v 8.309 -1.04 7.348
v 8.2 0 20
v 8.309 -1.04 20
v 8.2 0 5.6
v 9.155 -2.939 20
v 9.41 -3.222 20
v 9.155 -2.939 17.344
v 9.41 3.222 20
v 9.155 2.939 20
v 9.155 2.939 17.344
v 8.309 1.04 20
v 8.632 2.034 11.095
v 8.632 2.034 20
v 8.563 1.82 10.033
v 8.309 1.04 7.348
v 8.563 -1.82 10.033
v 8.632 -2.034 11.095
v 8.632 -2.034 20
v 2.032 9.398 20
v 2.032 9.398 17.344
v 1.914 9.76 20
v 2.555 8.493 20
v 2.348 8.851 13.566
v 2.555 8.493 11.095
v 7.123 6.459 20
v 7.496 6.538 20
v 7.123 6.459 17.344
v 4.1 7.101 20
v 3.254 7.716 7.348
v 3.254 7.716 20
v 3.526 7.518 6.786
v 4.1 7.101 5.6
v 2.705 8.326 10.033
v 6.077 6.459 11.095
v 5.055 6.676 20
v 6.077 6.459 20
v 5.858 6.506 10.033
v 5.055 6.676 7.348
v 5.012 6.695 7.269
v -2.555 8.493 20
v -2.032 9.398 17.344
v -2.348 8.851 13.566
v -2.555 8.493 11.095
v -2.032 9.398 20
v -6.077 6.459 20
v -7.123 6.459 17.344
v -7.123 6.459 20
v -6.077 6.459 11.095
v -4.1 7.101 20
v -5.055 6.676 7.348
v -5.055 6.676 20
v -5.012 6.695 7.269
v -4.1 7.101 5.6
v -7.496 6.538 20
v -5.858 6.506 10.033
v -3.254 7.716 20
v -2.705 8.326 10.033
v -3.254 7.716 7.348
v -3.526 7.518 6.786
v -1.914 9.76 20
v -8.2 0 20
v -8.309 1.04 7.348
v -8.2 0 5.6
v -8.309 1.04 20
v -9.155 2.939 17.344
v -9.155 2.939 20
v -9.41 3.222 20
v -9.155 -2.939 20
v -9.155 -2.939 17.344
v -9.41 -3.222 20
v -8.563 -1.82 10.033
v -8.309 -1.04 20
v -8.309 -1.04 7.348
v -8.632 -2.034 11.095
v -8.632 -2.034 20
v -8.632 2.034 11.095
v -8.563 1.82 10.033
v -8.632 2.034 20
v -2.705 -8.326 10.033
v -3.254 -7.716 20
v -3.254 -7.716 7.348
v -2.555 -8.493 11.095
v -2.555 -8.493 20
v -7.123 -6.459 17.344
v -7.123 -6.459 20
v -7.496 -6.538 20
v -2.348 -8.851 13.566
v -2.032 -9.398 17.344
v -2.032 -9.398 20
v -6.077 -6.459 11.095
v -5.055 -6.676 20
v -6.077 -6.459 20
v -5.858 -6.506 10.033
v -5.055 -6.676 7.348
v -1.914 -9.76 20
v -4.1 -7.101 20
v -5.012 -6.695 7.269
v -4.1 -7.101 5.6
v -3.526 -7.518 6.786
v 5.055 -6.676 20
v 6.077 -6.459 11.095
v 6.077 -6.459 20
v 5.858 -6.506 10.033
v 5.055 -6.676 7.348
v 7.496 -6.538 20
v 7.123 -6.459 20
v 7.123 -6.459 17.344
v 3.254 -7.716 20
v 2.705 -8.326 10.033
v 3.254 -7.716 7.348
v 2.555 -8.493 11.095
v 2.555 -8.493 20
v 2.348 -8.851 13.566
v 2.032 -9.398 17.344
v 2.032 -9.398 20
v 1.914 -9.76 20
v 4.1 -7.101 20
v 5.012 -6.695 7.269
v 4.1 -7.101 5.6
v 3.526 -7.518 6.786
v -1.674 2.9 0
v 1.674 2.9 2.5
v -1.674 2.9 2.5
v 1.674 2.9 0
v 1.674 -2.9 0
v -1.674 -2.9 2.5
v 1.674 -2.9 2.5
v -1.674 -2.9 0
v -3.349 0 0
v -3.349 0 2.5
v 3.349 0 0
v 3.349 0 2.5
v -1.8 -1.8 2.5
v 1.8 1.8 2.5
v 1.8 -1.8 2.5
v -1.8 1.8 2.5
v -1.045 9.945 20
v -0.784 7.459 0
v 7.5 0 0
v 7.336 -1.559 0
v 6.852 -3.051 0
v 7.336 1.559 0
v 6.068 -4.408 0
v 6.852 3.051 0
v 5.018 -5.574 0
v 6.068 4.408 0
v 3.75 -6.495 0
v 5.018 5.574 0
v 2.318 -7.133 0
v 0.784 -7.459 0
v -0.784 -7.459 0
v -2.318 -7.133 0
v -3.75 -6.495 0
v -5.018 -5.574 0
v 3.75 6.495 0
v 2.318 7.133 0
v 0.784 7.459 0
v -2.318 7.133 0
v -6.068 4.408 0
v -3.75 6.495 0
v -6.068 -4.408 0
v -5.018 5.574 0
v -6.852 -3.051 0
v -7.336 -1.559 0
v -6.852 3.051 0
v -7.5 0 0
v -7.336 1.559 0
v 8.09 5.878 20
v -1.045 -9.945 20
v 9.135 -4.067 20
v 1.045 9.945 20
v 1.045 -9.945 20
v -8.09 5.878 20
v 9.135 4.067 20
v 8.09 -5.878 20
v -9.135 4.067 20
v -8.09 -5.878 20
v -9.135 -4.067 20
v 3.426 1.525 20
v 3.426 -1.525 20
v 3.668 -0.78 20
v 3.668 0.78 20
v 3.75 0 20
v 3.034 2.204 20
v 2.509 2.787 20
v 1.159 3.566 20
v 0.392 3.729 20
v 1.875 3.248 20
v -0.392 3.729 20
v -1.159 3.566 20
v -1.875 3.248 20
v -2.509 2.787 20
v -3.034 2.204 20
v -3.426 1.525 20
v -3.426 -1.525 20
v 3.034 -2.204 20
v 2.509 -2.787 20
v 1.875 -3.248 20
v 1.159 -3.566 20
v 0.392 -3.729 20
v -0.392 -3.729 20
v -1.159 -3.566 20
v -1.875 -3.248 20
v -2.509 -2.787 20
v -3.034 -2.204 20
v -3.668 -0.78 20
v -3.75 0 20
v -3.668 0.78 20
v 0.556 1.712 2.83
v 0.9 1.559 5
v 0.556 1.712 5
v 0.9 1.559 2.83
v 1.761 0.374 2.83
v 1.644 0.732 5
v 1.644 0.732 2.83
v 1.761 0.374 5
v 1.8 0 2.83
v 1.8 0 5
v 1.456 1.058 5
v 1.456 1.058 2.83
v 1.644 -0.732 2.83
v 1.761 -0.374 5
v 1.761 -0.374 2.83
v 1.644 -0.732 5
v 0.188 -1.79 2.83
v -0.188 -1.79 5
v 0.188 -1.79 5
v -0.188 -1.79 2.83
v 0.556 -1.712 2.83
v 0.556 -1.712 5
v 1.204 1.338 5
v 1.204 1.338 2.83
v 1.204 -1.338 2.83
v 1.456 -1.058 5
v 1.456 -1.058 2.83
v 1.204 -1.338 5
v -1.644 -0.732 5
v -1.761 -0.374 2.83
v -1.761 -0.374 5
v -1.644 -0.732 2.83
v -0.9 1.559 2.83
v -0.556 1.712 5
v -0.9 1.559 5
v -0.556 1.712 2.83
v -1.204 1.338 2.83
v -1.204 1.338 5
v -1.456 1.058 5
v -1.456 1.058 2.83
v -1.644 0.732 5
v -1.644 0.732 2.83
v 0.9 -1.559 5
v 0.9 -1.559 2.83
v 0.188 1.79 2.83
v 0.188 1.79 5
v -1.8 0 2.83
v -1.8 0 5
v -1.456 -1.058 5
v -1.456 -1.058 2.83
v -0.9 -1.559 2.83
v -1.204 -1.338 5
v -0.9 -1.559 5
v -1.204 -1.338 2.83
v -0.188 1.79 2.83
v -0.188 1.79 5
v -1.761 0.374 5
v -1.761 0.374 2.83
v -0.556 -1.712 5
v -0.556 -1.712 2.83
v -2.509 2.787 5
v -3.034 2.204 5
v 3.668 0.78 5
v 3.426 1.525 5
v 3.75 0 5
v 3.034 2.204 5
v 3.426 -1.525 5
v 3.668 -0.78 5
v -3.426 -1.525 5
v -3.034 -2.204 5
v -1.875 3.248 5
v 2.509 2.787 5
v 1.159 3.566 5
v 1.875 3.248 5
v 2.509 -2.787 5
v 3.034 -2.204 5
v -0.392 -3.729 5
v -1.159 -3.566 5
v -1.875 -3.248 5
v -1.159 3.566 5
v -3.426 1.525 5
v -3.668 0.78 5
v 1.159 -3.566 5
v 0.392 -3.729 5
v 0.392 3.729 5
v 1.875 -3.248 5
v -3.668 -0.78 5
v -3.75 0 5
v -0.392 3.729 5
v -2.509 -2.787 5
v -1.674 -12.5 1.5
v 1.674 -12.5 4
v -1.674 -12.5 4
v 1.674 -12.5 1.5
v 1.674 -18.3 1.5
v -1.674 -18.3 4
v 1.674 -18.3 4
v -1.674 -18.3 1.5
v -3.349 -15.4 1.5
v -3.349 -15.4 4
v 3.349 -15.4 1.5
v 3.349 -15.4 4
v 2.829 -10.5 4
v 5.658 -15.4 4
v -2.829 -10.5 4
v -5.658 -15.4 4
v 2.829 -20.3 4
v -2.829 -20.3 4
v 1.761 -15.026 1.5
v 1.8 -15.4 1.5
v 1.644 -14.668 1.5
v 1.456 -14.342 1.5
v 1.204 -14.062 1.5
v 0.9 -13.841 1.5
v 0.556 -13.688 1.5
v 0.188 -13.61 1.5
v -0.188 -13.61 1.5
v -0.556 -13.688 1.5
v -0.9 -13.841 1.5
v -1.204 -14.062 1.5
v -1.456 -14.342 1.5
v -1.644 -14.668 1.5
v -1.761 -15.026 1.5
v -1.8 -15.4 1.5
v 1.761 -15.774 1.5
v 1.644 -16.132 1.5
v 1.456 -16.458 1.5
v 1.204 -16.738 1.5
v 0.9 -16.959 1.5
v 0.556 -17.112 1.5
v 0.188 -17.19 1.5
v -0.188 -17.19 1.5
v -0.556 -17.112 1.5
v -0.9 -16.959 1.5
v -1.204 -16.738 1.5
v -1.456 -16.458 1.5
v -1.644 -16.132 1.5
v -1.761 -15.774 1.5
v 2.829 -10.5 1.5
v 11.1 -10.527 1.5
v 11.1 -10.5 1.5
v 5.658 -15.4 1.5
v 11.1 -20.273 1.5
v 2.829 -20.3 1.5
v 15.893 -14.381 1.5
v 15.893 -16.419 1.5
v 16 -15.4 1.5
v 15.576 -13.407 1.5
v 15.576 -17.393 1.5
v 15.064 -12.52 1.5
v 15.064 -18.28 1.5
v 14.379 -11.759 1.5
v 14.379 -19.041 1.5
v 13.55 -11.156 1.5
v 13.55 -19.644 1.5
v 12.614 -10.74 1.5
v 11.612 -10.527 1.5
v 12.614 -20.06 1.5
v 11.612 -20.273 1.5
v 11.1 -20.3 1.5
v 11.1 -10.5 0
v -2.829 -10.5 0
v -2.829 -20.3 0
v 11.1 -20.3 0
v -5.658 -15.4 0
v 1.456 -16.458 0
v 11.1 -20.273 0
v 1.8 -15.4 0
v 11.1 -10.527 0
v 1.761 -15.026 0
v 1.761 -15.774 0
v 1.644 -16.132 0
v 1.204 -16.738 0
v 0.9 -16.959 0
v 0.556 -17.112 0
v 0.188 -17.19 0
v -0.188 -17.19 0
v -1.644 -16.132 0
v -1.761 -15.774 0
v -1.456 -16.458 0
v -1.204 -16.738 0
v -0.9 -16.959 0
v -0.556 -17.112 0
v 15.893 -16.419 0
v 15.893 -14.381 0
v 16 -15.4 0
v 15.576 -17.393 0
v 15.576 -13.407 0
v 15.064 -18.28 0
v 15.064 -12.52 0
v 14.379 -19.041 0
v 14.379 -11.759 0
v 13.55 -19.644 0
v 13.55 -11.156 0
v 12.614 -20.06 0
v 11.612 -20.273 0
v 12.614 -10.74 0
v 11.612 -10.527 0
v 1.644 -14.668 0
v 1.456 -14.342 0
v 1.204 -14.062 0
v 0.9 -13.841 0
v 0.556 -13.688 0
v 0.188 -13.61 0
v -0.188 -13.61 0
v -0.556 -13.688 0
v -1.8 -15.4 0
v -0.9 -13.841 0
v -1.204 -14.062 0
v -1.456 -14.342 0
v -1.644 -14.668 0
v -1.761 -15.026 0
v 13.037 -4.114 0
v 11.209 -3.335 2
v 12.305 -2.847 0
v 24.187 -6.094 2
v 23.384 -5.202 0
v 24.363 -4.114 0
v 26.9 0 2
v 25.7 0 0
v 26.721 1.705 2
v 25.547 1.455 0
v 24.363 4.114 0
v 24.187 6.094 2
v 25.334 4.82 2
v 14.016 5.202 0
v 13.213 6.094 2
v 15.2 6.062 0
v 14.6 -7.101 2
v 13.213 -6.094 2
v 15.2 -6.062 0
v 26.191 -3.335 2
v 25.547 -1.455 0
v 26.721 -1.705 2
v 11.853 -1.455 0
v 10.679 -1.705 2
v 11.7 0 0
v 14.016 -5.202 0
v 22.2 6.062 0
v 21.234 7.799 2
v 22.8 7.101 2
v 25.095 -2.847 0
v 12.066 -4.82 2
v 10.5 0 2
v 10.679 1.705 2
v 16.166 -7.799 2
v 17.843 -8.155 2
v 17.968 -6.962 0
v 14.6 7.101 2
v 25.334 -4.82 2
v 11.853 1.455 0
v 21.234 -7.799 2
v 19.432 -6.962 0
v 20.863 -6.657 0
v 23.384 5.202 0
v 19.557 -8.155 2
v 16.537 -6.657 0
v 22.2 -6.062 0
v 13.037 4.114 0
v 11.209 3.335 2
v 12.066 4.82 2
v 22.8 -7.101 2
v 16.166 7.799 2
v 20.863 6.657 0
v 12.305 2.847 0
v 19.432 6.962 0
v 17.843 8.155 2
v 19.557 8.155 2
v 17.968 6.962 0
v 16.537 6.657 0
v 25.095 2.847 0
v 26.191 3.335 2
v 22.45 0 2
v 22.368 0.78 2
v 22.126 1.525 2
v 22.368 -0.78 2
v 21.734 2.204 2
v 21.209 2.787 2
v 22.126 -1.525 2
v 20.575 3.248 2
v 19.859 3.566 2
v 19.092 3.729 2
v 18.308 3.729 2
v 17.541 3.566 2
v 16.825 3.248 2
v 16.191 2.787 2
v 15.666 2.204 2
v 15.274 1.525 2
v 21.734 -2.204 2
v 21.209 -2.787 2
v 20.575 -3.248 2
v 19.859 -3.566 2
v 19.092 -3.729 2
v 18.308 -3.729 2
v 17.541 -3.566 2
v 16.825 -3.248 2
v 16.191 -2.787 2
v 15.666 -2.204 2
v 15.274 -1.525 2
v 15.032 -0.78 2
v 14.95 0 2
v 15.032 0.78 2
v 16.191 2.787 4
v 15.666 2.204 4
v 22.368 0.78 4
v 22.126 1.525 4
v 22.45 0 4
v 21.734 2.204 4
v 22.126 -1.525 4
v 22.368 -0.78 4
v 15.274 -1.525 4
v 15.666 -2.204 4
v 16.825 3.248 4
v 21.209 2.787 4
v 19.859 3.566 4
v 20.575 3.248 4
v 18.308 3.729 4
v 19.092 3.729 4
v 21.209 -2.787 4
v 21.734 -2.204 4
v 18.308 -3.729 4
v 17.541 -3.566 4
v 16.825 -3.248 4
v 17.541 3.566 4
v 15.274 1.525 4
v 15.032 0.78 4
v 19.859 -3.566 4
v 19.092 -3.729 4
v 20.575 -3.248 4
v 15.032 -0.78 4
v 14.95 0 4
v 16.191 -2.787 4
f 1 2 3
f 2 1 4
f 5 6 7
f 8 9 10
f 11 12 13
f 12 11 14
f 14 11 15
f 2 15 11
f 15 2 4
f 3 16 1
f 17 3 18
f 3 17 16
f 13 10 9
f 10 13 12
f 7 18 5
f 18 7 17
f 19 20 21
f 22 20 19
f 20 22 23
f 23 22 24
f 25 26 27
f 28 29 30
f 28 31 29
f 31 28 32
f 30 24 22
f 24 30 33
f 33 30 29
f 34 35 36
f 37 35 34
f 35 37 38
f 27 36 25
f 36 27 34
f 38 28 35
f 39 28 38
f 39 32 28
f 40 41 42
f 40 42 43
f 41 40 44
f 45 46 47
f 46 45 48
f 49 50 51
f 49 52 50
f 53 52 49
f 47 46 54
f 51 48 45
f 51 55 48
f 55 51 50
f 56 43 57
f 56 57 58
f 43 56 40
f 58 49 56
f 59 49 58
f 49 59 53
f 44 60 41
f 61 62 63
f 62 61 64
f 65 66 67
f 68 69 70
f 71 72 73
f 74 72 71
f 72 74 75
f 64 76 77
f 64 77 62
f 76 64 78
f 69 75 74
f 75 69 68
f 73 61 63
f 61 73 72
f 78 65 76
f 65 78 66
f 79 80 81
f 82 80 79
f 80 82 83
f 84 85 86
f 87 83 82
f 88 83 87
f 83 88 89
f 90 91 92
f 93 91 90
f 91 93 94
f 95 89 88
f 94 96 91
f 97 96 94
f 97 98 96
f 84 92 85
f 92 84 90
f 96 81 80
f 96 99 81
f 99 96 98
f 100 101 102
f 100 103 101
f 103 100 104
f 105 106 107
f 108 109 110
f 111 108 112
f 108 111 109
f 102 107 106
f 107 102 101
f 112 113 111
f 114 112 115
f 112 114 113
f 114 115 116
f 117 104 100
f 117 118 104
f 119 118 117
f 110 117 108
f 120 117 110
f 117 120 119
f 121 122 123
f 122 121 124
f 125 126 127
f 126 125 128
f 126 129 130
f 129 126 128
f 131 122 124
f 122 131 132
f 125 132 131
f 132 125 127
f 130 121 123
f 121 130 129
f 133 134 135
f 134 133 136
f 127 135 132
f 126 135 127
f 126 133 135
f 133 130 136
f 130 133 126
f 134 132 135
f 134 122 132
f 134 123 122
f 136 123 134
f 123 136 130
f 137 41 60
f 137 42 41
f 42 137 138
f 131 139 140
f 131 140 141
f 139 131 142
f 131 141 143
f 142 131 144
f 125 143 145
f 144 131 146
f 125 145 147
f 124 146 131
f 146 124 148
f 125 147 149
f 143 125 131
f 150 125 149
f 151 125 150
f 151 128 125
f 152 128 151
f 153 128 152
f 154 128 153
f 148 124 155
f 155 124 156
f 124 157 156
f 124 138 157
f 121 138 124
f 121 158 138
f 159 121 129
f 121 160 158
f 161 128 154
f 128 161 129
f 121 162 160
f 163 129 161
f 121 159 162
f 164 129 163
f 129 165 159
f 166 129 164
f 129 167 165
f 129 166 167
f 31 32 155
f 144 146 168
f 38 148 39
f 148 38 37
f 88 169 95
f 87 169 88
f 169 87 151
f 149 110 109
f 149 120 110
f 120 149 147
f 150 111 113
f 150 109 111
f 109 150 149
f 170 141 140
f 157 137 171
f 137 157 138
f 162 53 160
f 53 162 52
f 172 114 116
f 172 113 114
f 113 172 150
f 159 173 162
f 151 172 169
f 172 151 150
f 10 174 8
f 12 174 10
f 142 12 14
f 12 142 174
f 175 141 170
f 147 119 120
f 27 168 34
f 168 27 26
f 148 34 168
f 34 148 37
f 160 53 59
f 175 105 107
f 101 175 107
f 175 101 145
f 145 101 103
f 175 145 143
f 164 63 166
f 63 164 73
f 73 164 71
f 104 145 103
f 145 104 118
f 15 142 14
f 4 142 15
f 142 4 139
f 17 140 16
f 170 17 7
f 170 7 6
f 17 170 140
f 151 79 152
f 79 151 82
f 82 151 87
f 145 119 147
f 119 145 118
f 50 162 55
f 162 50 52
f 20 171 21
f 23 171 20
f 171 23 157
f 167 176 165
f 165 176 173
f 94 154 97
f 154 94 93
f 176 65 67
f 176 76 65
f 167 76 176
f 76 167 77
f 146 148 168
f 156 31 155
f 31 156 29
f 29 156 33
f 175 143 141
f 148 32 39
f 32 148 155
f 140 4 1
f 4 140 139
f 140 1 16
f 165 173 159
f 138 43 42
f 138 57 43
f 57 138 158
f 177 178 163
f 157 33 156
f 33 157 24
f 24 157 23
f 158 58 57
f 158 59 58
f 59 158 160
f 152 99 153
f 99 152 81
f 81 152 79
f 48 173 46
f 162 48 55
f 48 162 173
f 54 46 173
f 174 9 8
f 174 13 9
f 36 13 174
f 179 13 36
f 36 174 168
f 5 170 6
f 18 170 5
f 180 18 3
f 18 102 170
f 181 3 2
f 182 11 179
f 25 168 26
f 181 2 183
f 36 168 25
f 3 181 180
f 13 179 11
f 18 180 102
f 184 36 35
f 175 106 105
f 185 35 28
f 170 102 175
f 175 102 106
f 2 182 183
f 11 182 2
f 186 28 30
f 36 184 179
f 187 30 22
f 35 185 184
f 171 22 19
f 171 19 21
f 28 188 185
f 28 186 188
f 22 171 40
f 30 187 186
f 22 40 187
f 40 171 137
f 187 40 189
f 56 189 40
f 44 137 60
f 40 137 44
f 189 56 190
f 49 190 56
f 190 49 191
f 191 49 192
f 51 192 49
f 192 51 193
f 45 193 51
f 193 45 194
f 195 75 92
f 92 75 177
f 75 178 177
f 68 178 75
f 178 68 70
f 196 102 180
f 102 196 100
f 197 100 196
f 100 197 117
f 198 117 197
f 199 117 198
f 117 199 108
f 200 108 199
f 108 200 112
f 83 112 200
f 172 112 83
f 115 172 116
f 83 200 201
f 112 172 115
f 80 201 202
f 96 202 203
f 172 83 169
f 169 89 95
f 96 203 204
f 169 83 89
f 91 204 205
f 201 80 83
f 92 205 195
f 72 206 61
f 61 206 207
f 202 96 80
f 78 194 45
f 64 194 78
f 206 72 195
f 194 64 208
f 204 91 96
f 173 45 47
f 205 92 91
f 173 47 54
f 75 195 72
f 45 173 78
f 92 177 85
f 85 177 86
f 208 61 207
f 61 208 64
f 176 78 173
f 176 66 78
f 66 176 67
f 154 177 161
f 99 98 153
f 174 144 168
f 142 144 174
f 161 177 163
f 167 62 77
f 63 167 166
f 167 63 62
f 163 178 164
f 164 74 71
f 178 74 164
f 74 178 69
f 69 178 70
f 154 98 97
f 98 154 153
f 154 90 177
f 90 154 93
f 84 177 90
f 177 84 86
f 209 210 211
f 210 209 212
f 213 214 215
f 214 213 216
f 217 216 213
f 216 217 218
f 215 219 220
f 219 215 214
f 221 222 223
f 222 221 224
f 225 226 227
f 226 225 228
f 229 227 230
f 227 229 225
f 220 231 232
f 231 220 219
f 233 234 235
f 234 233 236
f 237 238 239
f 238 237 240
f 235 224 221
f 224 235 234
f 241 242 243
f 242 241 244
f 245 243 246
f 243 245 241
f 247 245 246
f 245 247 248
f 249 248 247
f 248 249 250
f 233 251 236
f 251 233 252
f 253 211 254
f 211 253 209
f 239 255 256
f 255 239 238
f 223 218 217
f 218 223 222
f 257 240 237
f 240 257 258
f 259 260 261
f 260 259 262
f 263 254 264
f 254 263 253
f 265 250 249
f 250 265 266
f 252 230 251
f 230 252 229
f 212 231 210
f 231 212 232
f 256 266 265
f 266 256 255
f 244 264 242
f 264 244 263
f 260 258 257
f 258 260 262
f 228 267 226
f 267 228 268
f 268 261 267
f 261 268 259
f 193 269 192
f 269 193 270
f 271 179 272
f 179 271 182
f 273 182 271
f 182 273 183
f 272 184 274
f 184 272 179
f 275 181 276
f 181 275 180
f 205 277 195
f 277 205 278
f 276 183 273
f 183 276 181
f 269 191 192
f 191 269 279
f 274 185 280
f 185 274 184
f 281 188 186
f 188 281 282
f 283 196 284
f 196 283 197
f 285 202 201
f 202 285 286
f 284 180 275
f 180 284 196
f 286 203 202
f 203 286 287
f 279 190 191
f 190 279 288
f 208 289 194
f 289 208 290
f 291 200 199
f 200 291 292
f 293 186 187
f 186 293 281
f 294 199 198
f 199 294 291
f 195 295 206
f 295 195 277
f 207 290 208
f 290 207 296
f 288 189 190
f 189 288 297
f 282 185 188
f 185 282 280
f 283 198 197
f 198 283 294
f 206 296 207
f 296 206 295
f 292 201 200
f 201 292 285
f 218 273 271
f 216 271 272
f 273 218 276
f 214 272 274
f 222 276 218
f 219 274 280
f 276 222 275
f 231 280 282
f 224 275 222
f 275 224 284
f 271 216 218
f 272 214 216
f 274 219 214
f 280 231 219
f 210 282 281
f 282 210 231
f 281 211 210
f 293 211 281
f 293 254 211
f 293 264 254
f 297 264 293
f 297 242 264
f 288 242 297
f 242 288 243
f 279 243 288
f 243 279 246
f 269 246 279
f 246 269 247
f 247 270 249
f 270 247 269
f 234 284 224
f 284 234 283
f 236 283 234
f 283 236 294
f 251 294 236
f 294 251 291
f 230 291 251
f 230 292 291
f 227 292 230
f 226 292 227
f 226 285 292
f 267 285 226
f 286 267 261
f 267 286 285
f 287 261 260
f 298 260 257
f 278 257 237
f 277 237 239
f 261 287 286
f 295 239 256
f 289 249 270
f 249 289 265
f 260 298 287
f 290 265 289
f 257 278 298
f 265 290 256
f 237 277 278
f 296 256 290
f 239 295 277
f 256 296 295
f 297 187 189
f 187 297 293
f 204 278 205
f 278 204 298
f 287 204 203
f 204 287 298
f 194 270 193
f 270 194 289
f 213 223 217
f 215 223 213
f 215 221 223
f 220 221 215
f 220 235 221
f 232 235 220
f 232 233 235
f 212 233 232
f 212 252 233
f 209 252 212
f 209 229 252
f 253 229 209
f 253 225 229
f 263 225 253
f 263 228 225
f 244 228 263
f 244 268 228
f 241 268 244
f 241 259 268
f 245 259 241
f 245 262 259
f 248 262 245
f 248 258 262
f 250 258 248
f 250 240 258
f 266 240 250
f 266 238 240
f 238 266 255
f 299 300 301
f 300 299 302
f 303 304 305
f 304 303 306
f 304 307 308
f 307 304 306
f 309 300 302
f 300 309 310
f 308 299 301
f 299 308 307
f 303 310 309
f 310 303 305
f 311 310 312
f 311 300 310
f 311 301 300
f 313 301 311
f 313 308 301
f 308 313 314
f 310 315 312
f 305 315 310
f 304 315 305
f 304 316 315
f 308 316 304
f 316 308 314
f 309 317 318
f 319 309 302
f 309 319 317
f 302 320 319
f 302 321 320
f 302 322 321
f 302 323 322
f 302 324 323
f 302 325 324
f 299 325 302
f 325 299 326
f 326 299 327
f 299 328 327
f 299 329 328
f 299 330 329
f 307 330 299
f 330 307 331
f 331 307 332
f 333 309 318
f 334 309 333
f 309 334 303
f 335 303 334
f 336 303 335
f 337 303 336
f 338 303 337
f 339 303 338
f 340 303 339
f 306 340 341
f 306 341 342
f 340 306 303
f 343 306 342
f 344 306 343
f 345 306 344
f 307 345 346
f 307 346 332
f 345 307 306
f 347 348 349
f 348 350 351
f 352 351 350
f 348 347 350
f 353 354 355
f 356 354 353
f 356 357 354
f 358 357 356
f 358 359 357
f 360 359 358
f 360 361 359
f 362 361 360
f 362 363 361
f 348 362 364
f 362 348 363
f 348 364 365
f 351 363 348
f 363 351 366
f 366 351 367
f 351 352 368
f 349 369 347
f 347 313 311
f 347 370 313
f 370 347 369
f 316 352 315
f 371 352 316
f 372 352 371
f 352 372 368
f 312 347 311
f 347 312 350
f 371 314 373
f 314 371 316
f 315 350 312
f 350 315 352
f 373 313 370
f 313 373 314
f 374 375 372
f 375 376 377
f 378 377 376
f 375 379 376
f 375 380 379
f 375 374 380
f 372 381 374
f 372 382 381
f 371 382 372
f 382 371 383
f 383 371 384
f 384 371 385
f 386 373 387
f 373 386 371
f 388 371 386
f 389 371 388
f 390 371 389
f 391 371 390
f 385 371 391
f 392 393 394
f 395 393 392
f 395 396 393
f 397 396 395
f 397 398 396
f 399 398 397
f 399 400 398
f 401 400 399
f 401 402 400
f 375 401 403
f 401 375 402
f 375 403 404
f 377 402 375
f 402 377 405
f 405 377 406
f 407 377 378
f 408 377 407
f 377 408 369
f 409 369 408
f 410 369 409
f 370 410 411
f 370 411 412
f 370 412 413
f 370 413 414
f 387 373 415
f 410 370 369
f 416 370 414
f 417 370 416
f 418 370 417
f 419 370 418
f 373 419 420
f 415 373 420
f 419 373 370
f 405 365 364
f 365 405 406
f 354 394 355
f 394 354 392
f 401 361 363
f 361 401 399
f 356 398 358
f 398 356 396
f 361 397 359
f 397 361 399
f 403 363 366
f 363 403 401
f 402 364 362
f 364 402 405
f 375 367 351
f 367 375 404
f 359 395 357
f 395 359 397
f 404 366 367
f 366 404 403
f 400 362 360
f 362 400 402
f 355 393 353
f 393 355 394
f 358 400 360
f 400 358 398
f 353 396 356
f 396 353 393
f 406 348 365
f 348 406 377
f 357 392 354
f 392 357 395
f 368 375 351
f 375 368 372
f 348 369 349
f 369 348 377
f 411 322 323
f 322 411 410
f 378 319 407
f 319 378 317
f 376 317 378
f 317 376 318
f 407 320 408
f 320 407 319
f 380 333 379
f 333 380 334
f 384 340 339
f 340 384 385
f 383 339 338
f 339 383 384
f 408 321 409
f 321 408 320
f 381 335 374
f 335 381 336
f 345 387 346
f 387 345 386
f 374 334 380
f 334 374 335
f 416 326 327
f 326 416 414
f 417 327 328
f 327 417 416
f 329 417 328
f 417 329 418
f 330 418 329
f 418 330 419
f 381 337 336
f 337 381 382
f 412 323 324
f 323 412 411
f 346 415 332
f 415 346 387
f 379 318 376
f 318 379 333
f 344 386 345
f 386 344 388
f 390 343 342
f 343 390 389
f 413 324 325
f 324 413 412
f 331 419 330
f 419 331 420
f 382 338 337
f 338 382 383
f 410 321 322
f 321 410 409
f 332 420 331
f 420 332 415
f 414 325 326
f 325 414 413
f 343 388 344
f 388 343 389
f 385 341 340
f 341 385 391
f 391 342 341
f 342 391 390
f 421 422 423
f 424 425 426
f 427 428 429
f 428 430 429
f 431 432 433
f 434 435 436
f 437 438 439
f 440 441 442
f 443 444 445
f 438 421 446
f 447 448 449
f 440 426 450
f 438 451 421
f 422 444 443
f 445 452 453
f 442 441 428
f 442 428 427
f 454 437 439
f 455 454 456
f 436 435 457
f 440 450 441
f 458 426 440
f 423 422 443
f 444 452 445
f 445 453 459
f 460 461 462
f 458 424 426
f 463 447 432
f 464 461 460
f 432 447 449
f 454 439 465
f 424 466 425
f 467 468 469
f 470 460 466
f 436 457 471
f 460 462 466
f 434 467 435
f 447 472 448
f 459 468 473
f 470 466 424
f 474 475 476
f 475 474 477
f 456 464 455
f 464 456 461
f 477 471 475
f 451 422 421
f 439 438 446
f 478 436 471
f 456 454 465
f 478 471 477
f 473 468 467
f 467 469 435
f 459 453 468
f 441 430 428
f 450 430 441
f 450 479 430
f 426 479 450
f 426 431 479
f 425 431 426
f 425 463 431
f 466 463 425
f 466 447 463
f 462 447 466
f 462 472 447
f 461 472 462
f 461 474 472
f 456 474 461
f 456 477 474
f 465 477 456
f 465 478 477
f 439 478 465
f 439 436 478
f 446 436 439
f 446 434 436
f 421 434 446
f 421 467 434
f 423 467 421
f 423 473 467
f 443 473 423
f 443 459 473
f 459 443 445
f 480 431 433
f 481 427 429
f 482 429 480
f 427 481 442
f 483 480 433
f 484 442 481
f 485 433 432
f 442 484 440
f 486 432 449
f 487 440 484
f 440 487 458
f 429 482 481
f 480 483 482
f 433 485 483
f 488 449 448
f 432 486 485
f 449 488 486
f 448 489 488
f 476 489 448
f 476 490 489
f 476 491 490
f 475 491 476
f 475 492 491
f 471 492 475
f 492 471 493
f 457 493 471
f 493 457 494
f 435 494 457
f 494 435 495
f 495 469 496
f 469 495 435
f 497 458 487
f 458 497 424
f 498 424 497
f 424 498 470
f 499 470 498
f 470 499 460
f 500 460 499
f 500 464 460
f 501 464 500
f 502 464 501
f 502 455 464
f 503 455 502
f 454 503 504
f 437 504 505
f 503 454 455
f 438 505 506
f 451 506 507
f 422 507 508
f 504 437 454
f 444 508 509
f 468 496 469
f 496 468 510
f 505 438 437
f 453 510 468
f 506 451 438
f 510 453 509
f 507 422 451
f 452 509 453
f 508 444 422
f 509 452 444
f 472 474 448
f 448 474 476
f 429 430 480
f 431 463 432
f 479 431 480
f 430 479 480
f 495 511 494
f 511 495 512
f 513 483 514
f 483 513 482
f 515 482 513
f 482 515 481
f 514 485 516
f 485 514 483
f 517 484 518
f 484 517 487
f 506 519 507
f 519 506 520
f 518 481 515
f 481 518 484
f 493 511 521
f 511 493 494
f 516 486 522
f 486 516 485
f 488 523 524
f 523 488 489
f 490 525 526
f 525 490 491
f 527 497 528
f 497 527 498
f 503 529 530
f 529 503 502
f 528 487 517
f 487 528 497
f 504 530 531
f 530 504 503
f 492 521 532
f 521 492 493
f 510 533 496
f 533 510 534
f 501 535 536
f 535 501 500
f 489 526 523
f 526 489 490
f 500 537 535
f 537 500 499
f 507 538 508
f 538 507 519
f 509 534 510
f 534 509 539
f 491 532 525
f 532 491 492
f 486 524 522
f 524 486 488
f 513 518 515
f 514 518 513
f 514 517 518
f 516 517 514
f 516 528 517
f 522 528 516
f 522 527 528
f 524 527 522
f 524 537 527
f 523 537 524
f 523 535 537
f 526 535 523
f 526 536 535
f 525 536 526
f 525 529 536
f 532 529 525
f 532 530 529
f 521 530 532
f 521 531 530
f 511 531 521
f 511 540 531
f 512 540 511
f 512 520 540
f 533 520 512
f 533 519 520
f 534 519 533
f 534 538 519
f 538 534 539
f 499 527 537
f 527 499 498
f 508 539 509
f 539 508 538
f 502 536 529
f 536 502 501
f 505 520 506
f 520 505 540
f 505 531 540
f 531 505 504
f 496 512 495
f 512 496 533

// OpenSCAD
/*
 * Knob with Latch, v0.42
 *
 * by Alex Franke (CodeCreations), Jan 2013
 * http://www.theFrankes.com
 * 
 * Licenced under Creative Commons Attribution - Non-Commercial - Share Alike 3.0 
 * 
 * DESCRIPTION: This is a parametric knob with hole cover and latch. The latch is meant to hold 
 *   a door or drawer from the back so it doesn't pull out or open. The latch is engaged or 
 *   released by turning the knob. 
 * 
 * INSTRUCTIONS: Edit the "User-defined values" section to meet your needs. Check the echo output 
 *   (rendering output) for the minimum screw length required. Insert a screw through the top of 
 *   the knob, and screw a nut onto the end. Tighten the screw until the nut is brought up into 
 *   the knob and locks into place. Insert the exposed threaded screw through the material you're 
 *   attaching the knob to. Add the latch over the end of the screw with the nut trap facing out. 
 *   Add a nut and turn the the knob until the nut is brought into the latch. Add another nut 
 *   and tighten it down against the previously added nut to lock the latch into place. Place the 
 *   cap over the screw hole in the front of the knob and snap into place. 
 * 
 * VIDEO: http://www.youtube.com/watch?v=ZVg8XCQSZRU 
 * 
 * v0.42, Jan 1, 2013: Initial Release.
 * 
 * TODO: 
 *   * Fix OpenSCAD silliness so you don't have to run it through netfabb 
 */


/////////////////////////////////////////////////////////////////////////////
// User-defined values... 
/////////////////////////////////////////////////////////////////////////////

// Optional parameters that do not affect the rendered model
boardWidth             = 18;   // Used only for calculating minimum screw length

// Printer capabilities 
layerHeight            = 0.33; // Layer height for hole support material, or zero for none

// Hardware parameters 
holeDiameter           = 3.6;  // Diameter of clearance hole. M3=3
screwHeadDiameter      = 7.5;  // Diameter of the head of the screw. M3=6.7 
nutInDiameter          = 5.8;  // Flat-to-flat diameter of the nuts. M3=5.5 
nutHeight              = 2.5;  // Height or thickness of the nuts. M3=2.5

// Knob parameters 
knobBaseDiameter       = 15;   // Diameter of the base of the knob
knobTopDiameter        = 20;   // Diameter of the top of the knob
knobHeight             = 20;   // Total height of the knob (not including the cap) 
burlDiameter           = 10;   // Diameter of the burl cut-outs
burlInset              = 1.8;  // Distance the burl cut-outs are inset into the knob
screwHeadDepth         = 15;   // Depth of the screw head inside the knob

// Knob cap parameters 
knobCapTopDiameter     = 14;   // Top diameter of the knob cap 
knobCapHeight          = 2;    // Total height of the knob cap 
knobCapInsertionLength = 2;    // Insertion depth of the knob cap 

// Latch parameters 
latchThickness         = 1.5;  // Thickness of the latch material 
latchLength            = 16;   // Length of the latch, measured from the center of the hole
nutPadding             = 2;    // Width of material surrounding the nut on the latch

// Rendering parameters
printSeparation        = 3;    // Distance to separate rendered objects 
$fn                    = 30;   // General curve quality


/////////////////////////////////////////////////////////////////////////////
// The code... 
/////////////////////////////////////////////////////////////////////////////

// echo out required screw length 
echo( str("Screw length of at least ", knobHeight-screwHeadDepth+boardWidth
	+latchThickness+2*nutHeight, "mm required.") ); 

outerNutInDiameter = nutInDiameter+2*nutPadding; 

// Render Knob
knob();

// Render Latch
translate([0,-(knobBaseDiameter+outerNutInDiameter)/2-printSeparation,0]) 
	latch(); 

// Render Knob Cap
translate([knobBaseDiameter/2+max(knobCapTopDiameter/2,knobTopDiameter/2-burlInset)+printSeparation,0]) 
	knobCap(); 


/////////////////////////////////////////////////////////////////////////////
// Modules... 
/////////////////////////////////////////////////////////////////////////////

module knobCap() {
	union() {
		cylinder( r1=knobCapTopDiameter/2, r2=knobTopDiameter/2-burlInset, h=knobCapHeight);
		translate([0,0,knobCapHeight]) 
			cylinder(r=screwHeadDiameter/2, h=knobCapInsertionLength);
	}
}

module latch() {
	
	difference() {
		union() {
			translate([0,0,nutHeight/2+latchThickness]) 
				difference() {
					nut([outerNutInDiameter,nutHeight]);
					nut([nutInDiameter,nutHeight+1]);
				}
	
			translate([0,0,latchThickness/2]) 
				nut([outerNutInDiameter,latchThickness]);
	
			translate([latchLength/2,0,latchThickness/2]) 
				rotate([0,0,180]) 
					stick([latchLength,outerNutInDiameter,latchThickness], 1);
		}
	
		translate([0,0,-0.5]) 
			cylinder(h=latchThickness+nutHeight+1,r=holeDiameter/2);
	}

}

module knob() {

	if (knobHeight-screwHeadDepth-nutHeight < latchThickness) 
		echo("WARNING: Screw hole might be too deep!");

	union() {
		difference() {
			
			cylinder( r1=knobBaseDiameter/2, r2=knobTopDiameter/2, h=knobHeight);
	
			for ( i = [0 : 5] ) {
			   	rotate( [0,0, i*(360/6)])
					translate([(knobTopDiameter+burlDiameter)/2-burlInset,0,-0.5]) 
					   	cylinder( r=burlDiameter/2, h=knobHeight+1 );
			}
	
			translate([0,0,nutHeight/2 - 0.5]) 
				nut([nutInDiameter,nutHeight + 0.5]);	
	
			translate([0,0,nutHeight/2 - 0.5]) 
				cylinder(h=knobHeight-3, r=holeDiameter/2);	
	
	
			// Through hole 
			translate([0,0,-0.5]) 
				cylinder(h=knobHeight+1, r=holeDiameter/2);	
	
			// Screw head 
			translate([0,0,knobHeight-screwHeadDepth]) 
				cylinder(h=screwHeadDepth+1, r=screwHeadDiameter/2);	
	
			// Knob nut
			translate([0,0,(nutHeight+1)/2-1]) 
				nut([nutInDiameter,nutHeight+1]);
			
		}

		// support material to drill out. 
		translate([0,0,nutHeight+layerHeight/2]) 
			cube([holeDiameter,holeDiameter, layerHeight], center=true); 
	}
	
}

// My nutty nut code. nutSize = [inDiameter,thickness]
module nut( nutSize ) { 
	side = nutSize[0] * tan( 180/6 );
	if ( nutSize[0] * nutSize[1] != 0 ) {
		for ( i = [0 : 2] ) {
			rotate( i*120, [0, 0, 1]) 
				cube( [side, nutSize[0], nutSize[1]], center=true );
		}
	}
}

// Makes a stick with 0, 1, or 2 rounded ends, and optionally centered on the 
// circle center of one end. 
module stick( stickSize, numRounds, centerCircle=false ) {

	assign( dist = (stickSize[0]-stickSize[1])/2 )
	translate([centerCircle?dist:0,0,0]) 
	union() {
		for ( i=[-1,1] )
			translate([ i*dist, 0, 0 ]){
				cylinder( r=stickSize[1]/2, h=stickSize[2], center=true );
		}	
		cube(stickSize + [-stickSize[1],0,0], center=true);
		if ( numRounds < 2 ) 
			translate([ stickSize[0]/2 - stickSize[1]/4, 0, 0 ])
				cube([stickSize[1]/2,stickSize[1],stickSize[2]], center=true);
		if ( numRounds < 1 ) 
			translate([ -stickSize[0]/2 + stickSize[1]/4, 0, 0 ])
				cube([stickSize[1]/2,stickSize[1],stickSize[2]], center=true);
	}
}

